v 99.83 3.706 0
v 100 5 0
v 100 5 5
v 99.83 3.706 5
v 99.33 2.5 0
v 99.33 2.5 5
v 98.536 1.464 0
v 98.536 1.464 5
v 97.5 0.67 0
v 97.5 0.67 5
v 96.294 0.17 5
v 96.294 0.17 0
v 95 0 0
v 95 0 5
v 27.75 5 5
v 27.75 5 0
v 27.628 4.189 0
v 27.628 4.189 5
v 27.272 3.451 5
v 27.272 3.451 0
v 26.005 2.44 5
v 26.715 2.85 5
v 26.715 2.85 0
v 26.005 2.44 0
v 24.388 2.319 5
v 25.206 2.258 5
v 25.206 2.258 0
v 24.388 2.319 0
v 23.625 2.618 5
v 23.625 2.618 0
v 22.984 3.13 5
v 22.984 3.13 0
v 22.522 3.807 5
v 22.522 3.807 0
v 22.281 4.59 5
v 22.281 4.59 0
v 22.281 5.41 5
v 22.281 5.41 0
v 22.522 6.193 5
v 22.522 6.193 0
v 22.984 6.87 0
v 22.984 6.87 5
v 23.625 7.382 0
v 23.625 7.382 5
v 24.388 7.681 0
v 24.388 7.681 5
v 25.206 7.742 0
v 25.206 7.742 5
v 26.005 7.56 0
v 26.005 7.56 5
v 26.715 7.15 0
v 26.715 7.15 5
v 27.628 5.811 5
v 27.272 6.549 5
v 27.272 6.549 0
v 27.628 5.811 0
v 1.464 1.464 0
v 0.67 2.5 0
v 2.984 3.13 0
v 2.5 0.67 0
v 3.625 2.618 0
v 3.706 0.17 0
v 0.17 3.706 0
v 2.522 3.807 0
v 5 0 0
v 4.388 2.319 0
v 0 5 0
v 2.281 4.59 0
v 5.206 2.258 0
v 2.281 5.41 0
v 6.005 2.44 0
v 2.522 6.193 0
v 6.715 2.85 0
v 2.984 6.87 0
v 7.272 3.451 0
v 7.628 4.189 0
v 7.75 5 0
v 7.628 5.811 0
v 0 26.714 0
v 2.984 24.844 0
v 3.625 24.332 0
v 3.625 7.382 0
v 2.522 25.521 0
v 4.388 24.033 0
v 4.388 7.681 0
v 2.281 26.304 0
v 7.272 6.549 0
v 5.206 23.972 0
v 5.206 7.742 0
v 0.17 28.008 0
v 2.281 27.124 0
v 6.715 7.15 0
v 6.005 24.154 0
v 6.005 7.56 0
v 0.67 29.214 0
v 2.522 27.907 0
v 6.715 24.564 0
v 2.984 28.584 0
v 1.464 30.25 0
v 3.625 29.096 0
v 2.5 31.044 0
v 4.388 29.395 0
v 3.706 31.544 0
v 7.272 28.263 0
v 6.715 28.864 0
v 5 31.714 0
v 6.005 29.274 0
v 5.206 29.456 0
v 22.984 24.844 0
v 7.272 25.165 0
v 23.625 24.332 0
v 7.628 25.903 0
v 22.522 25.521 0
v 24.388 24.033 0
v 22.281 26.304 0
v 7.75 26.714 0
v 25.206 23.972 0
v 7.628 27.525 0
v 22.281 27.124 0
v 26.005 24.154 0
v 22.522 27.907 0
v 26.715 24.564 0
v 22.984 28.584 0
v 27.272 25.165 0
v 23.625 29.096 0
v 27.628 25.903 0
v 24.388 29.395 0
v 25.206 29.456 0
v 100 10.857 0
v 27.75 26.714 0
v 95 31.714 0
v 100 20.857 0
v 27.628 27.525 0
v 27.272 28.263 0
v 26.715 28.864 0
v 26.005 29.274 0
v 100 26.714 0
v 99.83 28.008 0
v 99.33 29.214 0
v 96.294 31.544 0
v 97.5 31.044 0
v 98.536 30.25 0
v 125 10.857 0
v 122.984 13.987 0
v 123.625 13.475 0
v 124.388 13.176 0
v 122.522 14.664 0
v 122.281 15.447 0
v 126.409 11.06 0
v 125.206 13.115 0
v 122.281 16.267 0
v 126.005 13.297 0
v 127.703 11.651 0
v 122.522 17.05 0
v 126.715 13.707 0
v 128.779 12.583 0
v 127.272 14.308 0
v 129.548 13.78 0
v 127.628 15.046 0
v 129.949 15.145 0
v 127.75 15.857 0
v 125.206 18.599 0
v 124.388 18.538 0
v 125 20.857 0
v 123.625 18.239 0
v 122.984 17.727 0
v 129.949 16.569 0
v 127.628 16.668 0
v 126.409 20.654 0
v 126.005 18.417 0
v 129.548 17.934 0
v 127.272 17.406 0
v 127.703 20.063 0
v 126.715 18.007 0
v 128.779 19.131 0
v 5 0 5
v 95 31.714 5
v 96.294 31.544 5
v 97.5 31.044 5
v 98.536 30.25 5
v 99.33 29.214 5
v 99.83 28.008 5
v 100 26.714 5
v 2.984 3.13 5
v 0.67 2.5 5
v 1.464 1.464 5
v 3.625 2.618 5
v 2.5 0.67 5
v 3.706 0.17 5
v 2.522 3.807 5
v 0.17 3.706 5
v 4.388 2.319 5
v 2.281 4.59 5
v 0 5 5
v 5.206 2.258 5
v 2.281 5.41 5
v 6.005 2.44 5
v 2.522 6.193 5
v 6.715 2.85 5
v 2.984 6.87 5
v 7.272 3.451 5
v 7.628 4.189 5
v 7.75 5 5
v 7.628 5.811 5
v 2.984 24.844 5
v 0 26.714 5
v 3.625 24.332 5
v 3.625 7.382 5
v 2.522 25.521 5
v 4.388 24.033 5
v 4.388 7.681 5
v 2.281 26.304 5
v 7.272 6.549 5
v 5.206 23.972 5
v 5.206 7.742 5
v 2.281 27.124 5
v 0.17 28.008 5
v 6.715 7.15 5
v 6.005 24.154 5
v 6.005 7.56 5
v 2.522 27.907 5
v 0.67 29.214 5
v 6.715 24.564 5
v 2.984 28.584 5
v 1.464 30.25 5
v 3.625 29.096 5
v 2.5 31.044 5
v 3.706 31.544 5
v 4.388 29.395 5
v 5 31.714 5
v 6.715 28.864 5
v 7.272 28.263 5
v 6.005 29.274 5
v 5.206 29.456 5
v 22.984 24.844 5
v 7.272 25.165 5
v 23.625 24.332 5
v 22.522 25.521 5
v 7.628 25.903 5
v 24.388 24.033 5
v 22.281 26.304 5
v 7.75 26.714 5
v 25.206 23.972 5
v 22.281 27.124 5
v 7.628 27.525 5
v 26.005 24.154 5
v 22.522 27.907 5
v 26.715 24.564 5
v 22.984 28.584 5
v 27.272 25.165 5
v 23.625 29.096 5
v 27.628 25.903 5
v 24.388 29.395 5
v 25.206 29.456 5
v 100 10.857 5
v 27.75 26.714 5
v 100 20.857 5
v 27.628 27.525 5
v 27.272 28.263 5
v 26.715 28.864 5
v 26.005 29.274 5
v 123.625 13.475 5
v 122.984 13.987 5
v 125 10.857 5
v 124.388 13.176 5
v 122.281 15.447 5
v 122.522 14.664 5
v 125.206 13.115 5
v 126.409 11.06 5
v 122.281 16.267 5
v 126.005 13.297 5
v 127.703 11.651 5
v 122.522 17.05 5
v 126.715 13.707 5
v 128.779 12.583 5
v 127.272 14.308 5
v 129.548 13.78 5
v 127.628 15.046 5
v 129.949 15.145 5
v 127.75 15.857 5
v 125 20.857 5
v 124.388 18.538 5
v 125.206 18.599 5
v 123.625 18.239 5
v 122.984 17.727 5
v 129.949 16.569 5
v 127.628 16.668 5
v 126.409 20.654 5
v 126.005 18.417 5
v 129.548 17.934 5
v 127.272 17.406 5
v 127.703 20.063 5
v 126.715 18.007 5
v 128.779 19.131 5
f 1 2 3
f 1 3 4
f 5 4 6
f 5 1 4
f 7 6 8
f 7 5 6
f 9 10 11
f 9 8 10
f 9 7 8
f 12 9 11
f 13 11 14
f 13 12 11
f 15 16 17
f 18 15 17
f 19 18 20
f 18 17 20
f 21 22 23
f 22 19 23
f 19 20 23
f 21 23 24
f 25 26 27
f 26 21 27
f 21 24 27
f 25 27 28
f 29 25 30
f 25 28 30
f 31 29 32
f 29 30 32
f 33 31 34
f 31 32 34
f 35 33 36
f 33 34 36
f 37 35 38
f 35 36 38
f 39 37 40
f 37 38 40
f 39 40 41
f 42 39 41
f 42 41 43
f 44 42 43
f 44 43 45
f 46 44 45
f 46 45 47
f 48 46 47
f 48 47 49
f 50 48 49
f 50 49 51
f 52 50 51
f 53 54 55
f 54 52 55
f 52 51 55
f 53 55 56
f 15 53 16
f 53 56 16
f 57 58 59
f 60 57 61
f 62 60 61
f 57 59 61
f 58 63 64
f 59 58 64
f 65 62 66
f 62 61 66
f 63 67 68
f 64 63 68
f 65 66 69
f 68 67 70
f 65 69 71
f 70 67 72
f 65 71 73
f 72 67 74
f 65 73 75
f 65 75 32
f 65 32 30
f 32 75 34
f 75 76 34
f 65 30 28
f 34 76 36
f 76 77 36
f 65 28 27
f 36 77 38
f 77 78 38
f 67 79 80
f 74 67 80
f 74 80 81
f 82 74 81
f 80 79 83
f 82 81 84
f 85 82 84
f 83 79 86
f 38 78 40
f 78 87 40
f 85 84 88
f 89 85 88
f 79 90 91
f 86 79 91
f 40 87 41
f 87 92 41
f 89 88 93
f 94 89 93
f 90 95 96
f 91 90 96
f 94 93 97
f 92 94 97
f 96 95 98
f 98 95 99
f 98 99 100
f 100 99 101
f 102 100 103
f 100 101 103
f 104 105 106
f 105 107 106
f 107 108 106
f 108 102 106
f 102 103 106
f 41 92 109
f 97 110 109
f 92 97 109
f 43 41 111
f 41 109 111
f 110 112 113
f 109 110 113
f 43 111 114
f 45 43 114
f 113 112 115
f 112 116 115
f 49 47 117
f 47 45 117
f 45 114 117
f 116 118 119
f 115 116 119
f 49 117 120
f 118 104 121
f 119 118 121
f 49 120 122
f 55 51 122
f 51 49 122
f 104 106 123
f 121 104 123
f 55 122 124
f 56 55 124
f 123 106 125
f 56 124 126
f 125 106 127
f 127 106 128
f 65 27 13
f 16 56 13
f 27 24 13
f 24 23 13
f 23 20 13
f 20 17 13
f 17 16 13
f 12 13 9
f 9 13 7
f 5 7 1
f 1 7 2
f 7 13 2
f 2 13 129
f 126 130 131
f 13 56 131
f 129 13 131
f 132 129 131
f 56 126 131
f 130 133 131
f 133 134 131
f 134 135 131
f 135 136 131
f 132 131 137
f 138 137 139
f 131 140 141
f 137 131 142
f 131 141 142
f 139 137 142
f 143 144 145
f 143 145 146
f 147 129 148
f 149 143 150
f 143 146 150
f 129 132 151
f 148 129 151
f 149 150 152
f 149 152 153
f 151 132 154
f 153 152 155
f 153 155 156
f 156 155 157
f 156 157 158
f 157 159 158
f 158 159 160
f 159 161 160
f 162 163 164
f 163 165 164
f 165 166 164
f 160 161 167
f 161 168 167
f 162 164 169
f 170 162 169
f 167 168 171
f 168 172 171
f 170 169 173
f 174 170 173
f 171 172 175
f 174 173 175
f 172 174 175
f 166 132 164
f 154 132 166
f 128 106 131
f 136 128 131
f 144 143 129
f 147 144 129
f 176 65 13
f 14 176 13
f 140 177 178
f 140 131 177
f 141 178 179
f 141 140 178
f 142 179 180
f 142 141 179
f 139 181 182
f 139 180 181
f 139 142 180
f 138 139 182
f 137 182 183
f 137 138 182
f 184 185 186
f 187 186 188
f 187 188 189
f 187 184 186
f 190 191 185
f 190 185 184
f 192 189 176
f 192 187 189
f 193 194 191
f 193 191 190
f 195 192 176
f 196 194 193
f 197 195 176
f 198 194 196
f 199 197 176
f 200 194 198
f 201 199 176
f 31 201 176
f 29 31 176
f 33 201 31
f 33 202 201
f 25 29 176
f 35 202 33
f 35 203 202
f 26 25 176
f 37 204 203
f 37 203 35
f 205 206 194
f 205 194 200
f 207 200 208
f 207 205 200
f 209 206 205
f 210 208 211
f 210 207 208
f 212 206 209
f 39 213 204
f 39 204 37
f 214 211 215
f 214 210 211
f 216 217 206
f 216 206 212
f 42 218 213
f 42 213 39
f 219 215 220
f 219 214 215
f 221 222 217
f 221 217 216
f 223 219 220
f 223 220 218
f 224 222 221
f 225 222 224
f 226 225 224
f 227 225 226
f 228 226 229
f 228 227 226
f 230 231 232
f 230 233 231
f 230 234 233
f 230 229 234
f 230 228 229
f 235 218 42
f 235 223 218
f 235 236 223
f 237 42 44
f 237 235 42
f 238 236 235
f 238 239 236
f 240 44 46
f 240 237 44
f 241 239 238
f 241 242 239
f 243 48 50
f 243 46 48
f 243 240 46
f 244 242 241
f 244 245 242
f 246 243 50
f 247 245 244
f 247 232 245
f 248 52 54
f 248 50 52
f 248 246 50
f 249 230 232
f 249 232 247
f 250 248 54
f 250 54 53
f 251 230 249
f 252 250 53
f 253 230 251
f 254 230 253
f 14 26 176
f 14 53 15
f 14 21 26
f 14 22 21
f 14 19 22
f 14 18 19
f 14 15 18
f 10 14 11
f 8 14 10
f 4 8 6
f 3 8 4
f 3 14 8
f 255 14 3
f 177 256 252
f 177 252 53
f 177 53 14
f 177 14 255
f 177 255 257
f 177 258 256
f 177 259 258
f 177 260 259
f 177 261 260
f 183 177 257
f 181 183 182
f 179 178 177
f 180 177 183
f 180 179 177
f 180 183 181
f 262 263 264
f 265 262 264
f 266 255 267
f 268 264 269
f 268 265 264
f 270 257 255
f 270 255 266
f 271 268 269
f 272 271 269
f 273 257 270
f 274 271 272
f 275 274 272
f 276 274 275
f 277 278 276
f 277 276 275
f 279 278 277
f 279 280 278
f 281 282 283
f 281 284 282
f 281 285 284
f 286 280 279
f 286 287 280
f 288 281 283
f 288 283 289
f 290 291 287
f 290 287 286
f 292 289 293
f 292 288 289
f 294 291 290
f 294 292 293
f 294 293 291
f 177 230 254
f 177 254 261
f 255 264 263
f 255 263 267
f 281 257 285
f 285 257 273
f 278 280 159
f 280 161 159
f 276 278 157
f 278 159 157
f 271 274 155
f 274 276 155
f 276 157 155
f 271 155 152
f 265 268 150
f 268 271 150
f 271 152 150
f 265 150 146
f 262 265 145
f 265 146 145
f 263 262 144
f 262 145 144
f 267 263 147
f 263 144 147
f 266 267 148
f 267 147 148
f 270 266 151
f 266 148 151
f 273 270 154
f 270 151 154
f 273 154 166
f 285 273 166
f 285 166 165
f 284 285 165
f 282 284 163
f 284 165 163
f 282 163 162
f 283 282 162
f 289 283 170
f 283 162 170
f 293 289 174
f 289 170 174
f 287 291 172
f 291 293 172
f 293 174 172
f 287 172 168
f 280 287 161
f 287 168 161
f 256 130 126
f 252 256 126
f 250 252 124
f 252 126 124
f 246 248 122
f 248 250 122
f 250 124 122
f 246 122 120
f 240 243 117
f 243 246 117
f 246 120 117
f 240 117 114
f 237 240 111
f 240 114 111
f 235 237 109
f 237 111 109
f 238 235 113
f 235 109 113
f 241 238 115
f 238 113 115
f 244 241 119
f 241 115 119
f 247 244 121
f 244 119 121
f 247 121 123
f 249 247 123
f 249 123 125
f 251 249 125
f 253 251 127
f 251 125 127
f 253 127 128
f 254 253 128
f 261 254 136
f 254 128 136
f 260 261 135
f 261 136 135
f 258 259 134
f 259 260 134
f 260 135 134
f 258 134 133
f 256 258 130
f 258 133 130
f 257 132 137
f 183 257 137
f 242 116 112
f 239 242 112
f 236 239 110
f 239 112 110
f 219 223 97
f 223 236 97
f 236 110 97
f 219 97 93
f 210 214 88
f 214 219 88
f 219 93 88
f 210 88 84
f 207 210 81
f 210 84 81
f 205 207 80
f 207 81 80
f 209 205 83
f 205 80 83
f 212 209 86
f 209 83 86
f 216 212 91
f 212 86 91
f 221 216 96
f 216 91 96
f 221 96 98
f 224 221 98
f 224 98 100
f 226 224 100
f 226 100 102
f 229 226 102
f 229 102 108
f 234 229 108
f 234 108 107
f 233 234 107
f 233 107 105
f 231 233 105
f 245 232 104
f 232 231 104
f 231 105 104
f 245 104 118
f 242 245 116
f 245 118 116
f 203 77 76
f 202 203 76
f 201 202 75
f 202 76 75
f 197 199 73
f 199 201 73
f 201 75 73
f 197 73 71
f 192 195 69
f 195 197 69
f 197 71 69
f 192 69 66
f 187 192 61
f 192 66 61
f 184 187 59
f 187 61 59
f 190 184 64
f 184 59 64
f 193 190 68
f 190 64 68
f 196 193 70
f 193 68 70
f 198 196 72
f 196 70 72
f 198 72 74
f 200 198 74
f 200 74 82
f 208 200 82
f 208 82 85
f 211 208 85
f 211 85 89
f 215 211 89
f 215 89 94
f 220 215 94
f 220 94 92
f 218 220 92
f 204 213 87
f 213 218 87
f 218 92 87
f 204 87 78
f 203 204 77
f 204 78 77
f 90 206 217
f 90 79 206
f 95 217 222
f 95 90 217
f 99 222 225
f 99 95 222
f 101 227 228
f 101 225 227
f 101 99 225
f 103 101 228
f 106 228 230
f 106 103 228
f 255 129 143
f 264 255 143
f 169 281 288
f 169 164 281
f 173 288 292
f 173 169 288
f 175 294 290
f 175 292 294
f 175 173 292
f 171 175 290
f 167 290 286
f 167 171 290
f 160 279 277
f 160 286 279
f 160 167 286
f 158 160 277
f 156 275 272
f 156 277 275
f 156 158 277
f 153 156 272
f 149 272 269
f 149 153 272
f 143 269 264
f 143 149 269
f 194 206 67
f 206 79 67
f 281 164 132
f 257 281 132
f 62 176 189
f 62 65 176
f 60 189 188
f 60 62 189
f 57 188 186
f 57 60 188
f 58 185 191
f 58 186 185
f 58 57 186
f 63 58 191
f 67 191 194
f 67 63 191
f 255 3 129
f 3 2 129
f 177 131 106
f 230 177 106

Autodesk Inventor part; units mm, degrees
ref_plane "YZ Plane" through (0, 0, 0) normal (1, 0, 0) x (0, 1, 0)
ref_plane "XZ Plane" through (0, 0, 0) normal (0, 1, 0) x (-1, 0, 0)
ref_plane "XY Plane" through (0, 0, 0) normal (0, 0, 1) x (1, 0, 0)
sketch "Sketch1" plane through (0, 0, 0) normal (0, 0, 1) x (1, 0, 0)
  line L0 (5, 0) -> (95, 0)
  line L1 (100, 5) -> (100, 26.714)
  line L2 (95, 31.714) -> (5, 31.714)
  line L3 (0, 26.714) -> (0, 5)
  arc A0 (5, 31.714) -> (0, 26.714) centre (5, 26.714) ccw
  arc A1 (0, 5) -> (5, 0) centre (5, 5) ccw
  circle A2 centre (5, 5) radius 2.75
  circle A3 centre (5, 26.714) radius 2.75
  circle A4 centre (25, 26.714) radius 2.75
  circle A5 centre (25, 5) radius 2.75
  arc A6 (100, 26.714) -> (95, 31.714) centre (95, 26.714) ccw
  arc A7 (95, 0) -> (100, 5) centre (95, 5) ccw
  line L4 (125, 20.857) -> (70, 20.857)
  line L5 (70, 20.857) -> (70, 10.857)
  line L6 (70, 10.857) -> (125, 10.857)
  line L7 (130, 15.857) -> (130, 15.857)
  line L8 (130, 20.857) -> (70, 10.857) construction
  line L9 (70, 20.857) -> (130, 10.857) construction
  circle A8 centre (125, 15.857) radius 2.75
  arc A9 (130, 15.857) -> (125, 20.857) centre (125, 15.857) ccw
  arc A10 (125, 10.857) -> (130, 15.857) centre (125, 15.857) ccw
  point P0 (0, 0)
  point P1 (100, 31.714)
  point P2 (100, 0)
  point P3 (100, 15.857)
  point P4 (0, 15.857)
  point P5 (100, 10.857)
  point P6 (100, 20.857)
  dimension "d0" = 100
  dimension "d1" = 31.714
  dimension "d2" = 5
  dimension "d3" = 5.5
  dimension "d4" = 5.5
  dimension "d5" = 21.714
  dimension "d8" = 20
  dimension "d13" = 5
  dimension "d14" = 10
  dimension "d15" = 60
  dimension "d16" = 5.5
  dimension "d17" = 5
  dimension "d18" = 5
extrude "Extrusion1" add sketch "Sketch1" along normal blind 5
properties part number "Arm2"
